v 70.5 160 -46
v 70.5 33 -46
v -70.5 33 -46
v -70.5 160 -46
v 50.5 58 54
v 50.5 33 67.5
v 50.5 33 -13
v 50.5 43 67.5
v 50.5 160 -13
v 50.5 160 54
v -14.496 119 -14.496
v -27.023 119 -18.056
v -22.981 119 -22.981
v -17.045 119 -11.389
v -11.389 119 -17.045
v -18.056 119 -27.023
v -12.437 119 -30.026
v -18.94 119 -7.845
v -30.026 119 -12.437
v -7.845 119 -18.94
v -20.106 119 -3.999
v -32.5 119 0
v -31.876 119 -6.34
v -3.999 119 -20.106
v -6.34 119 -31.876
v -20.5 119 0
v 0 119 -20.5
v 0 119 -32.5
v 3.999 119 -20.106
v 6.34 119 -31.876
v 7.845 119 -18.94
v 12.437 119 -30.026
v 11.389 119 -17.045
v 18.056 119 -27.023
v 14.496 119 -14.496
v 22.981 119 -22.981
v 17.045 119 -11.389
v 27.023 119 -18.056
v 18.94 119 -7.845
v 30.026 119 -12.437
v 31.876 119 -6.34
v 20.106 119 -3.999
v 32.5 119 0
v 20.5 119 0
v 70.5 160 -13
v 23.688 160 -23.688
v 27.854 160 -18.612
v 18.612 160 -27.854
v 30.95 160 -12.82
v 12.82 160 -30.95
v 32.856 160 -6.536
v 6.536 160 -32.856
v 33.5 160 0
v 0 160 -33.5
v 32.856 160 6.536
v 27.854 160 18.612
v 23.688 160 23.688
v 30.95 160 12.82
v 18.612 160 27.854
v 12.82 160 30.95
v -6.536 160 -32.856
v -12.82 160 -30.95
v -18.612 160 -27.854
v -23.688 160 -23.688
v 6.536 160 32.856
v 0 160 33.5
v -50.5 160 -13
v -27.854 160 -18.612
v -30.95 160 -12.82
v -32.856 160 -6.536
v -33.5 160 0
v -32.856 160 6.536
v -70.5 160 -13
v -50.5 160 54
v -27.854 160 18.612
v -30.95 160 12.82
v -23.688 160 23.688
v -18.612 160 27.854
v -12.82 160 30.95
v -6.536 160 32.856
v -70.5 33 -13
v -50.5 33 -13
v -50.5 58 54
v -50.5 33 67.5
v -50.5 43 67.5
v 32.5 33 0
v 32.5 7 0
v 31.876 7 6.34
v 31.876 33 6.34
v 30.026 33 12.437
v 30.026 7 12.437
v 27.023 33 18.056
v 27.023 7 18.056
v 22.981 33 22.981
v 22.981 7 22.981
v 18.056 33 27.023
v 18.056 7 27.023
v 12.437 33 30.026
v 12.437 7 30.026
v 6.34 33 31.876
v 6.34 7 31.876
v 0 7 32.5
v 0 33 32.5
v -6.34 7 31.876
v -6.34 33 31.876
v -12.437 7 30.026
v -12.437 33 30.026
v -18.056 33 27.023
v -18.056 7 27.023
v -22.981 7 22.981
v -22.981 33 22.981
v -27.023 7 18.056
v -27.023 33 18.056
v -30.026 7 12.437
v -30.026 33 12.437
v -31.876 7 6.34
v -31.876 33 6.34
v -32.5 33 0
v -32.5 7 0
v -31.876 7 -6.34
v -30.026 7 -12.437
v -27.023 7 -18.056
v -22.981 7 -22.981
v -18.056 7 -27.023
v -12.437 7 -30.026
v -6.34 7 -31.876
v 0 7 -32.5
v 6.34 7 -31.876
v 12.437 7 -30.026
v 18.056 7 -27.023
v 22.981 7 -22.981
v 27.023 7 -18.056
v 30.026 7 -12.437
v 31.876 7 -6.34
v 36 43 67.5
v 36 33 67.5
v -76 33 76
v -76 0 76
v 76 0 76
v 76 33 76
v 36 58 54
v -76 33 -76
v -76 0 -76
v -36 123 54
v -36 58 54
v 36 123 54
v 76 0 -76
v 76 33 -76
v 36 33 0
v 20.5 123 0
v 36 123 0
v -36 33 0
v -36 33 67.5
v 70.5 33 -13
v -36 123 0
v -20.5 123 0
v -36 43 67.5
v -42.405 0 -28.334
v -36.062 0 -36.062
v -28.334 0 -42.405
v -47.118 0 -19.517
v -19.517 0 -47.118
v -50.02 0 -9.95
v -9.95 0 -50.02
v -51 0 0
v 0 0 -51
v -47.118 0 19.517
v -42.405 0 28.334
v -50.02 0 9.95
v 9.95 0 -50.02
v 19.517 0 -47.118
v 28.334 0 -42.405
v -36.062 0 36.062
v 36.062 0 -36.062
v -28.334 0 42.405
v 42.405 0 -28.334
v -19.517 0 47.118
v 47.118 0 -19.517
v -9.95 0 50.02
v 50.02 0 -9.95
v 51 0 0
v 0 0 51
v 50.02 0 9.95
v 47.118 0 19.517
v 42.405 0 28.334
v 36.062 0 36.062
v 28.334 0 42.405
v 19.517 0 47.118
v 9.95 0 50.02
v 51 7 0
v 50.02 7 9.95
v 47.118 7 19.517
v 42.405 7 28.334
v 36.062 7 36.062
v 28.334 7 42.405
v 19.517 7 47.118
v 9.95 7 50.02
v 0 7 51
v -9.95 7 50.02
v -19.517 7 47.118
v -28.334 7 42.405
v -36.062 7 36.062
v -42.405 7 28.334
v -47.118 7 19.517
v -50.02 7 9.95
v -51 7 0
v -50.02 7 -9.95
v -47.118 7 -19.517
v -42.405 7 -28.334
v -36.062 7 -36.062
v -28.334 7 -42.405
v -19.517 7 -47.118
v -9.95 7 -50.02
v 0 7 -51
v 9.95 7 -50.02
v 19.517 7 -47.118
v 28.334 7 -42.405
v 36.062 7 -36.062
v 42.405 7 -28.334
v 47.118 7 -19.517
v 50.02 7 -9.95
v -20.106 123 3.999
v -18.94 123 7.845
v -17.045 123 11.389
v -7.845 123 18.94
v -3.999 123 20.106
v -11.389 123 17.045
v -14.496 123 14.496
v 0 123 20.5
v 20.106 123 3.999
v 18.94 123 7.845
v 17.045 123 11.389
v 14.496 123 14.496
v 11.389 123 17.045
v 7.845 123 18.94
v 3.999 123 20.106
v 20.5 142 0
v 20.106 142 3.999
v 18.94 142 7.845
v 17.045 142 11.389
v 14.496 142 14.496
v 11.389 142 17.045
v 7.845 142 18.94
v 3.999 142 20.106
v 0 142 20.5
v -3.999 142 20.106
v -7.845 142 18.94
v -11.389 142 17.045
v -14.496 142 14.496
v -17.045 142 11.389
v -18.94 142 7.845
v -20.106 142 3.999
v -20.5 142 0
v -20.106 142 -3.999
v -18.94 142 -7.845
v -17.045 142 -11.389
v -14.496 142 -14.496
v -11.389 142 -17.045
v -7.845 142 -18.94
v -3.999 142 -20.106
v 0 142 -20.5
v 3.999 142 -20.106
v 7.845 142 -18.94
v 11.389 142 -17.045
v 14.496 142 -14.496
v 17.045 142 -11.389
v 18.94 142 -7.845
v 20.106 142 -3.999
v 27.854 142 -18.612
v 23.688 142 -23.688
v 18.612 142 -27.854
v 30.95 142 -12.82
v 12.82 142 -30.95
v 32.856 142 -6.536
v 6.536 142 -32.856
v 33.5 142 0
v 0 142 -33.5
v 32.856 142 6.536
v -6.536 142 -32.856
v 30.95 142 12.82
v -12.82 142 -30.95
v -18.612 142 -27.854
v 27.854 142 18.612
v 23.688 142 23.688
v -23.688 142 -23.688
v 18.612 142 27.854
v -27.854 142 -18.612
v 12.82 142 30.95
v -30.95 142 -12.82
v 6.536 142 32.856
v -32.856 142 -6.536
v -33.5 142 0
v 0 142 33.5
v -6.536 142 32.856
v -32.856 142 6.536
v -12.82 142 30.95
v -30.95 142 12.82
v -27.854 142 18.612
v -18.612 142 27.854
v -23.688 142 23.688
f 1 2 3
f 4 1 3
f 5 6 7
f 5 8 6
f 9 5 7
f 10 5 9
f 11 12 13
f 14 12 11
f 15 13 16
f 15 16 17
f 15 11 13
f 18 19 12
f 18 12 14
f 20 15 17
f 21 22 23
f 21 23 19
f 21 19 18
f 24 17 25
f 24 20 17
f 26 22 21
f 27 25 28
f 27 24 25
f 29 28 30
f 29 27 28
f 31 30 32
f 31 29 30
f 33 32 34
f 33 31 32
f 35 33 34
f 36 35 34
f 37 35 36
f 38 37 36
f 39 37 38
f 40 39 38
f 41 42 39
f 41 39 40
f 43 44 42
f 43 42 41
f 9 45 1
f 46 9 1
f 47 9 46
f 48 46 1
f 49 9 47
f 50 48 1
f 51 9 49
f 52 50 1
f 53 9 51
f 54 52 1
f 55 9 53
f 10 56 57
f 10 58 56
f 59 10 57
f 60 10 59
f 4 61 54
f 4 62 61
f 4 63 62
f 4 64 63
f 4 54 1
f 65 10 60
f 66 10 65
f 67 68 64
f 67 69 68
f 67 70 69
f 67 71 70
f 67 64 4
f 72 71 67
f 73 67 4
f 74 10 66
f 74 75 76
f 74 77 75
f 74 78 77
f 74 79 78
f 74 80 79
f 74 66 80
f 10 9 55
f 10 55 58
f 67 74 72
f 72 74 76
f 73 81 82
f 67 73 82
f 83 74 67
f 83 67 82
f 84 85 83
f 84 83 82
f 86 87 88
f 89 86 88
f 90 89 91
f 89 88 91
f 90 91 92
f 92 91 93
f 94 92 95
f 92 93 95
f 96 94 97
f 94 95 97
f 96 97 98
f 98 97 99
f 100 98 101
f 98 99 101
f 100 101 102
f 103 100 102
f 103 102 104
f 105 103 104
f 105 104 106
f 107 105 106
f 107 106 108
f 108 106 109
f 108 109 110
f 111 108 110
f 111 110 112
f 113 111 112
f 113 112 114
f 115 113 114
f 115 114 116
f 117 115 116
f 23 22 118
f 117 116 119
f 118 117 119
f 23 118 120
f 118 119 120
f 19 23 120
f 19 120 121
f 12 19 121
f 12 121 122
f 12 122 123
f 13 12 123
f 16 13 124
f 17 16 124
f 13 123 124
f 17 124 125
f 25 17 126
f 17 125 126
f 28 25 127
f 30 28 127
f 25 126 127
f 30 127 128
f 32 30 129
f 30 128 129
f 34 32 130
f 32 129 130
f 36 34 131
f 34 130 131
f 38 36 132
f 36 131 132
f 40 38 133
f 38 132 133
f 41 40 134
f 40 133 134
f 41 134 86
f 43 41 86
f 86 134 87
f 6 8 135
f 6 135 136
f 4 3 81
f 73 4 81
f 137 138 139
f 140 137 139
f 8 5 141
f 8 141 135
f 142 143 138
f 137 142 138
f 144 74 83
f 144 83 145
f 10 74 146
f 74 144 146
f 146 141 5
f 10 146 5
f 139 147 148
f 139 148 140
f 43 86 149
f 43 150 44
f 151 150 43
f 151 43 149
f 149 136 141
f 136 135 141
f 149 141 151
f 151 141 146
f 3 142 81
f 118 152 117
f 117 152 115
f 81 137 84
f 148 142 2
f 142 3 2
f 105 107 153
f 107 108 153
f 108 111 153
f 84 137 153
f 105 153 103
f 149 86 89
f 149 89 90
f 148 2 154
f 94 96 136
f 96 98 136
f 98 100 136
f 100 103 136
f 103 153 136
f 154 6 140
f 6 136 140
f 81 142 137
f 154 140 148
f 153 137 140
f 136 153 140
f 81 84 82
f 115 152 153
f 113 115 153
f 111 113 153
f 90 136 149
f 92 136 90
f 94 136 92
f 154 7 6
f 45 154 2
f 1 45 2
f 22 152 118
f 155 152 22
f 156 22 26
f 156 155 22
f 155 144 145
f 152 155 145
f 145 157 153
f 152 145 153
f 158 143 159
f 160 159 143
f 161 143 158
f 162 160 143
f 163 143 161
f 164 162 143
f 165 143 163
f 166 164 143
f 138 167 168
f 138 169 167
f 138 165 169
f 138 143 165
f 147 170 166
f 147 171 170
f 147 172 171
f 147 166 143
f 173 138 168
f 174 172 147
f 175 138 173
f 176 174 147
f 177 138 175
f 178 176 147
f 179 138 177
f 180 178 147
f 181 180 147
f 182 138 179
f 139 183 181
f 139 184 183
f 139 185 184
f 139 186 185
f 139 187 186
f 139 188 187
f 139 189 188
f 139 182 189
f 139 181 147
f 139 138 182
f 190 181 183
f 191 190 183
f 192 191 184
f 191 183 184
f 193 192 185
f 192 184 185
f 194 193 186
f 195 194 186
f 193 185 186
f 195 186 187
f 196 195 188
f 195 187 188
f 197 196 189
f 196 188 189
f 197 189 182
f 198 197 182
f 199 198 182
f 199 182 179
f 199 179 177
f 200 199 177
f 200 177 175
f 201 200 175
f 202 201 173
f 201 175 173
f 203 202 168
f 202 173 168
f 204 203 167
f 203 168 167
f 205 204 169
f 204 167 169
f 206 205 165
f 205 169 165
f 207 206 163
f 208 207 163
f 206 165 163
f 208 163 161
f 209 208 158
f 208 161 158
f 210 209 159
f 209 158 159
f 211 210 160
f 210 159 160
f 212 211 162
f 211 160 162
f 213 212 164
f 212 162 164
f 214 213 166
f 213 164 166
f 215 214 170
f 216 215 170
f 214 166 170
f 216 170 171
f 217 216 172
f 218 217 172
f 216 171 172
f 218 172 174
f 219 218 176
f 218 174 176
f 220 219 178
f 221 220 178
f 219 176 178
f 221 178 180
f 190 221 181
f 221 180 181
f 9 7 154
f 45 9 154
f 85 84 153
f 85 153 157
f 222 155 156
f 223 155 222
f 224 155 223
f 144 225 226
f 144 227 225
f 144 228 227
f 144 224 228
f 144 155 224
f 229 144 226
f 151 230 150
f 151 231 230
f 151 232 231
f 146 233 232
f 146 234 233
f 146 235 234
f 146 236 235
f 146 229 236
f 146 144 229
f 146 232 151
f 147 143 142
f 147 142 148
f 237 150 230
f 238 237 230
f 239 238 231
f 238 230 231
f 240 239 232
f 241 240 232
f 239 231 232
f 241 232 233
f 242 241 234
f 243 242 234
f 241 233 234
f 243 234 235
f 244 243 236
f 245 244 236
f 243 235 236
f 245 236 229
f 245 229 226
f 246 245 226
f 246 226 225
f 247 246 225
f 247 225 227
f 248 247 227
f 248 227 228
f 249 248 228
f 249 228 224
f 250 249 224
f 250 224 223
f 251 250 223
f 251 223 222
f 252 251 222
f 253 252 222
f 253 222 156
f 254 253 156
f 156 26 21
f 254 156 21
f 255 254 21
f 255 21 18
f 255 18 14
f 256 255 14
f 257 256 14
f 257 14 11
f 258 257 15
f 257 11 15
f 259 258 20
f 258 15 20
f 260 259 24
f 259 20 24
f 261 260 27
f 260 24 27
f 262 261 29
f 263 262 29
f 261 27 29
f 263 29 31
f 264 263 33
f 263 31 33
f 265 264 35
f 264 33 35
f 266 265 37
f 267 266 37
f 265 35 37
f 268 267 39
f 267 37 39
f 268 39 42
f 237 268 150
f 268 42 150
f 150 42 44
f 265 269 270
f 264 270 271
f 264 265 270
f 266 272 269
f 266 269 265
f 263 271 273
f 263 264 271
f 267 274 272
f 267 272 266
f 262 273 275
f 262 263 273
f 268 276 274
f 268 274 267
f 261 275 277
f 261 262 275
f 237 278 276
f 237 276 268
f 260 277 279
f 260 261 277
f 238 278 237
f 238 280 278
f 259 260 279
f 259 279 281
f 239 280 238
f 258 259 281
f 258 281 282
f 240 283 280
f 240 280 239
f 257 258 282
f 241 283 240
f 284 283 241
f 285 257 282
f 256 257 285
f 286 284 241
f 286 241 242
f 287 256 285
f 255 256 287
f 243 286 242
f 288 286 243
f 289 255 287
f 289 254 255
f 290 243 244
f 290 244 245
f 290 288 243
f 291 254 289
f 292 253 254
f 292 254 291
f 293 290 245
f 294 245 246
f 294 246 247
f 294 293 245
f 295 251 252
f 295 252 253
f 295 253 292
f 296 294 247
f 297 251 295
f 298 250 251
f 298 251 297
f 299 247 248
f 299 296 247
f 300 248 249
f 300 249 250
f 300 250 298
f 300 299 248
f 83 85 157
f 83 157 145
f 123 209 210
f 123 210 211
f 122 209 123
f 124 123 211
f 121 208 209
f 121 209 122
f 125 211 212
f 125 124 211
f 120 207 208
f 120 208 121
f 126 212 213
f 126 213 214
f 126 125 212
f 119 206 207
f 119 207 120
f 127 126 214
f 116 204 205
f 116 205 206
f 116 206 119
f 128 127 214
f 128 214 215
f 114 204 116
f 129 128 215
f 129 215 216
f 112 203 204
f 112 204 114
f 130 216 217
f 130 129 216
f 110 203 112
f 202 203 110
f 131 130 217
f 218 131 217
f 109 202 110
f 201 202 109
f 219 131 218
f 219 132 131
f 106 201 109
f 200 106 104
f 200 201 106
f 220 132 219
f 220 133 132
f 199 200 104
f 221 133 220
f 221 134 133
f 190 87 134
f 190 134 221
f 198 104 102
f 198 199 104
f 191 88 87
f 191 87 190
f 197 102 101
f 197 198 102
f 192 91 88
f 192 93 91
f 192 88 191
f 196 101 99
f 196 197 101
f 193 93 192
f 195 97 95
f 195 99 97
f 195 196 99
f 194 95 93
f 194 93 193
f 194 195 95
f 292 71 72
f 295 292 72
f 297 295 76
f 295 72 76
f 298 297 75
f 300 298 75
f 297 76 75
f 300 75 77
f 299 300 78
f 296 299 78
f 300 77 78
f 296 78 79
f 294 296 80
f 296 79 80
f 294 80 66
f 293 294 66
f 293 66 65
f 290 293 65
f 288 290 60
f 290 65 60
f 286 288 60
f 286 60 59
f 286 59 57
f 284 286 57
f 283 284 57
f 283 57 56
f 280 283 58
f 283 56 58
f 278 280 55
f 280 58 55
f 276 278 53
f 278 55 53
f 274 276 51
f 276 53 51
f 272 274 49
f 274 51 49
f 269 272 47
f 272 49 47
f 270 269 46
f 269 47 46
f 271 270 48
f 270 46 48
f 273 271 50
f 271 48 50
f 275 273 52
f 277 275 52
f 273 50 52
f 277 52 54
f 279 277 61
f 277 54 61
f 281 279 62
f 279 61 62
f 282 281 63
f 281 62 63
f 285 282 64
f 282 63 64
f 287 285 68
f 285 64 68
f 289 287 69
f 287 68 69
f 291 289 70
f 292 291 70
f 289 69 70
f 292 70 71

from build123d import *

# Parameters (mm, degrees)
F0_W      = 152
F0_H      = 152
F1_DEPTH  = 33
F3_DEPTH  = 127
F4_R      = 20.5
F5_DEPTH  = 156
F4_R_2    = 32.5
F6_DEPTH  = 119
F4_R_3    = 51
F7_DEPTH  = 7
F8_R      = 33.5
F9_DEPTH  = 18
F10_W     = 72
F10_H     = 90
F11_DEPTH = 54
F13_DEPTH = 14.5
F15_DEPTH = 14.5


with BuildPart() as f1:
    # F0 (on Front) → F1 (new body)
    with BuildSketch(Plane.XZ):
        Rectangle(F0_W, F0_H)
    extrude(amount=-F1_DEPTH)

    # F2 (on face) → F3 (join)
    with BuildSketch(Plane(origin=(0, 33, 0), x_dir=(-1, 0, 0), z_dir=(0, 1, 0))):
        Polygon((50.5, 54), (-50.5, 54), (-50.5, -13), (-70.5, -13), (-70.5, -46), (70.5, -46), (70.5, -13), (50.5, -13), align=None)
    extrude(amount=F3_DEPTH)

    # F4 (on Front) → F5 (cut)
    with BuildSketch(Plane.XZ):
        Circle(F4_R)
    extrude(amount=-F5_DEPTH, mode=Mode.SUBTRACT)

    # F4 (on Front) → F6 (cut)
    with BuildSketch(Plane.XZ):
        Circle(F4_R_2)
        Circle(F4_R, mode=Mode.SUBTRACT)
        Circle(F4_R)
    extrude(amount=-F6_DEPTH, mode=Mode.SUBTRACT)

    # F4 (on Front) → F7 (cut)
    with BuildSketch(Plane.XZ):
        Circle(F4_R_3)
        Circle(F4_R_2, mode=Mode.SUBTRACT)
    extrude(amount=-F7_DEPTH, mode=Mode.SUBTRACT)

    # F8 (on face) → F9 (cut)
    with BuildSketch(Plane(origin=(0, 160, 0), x_dir=(-1, 0, 0), z_dir=(0, 1, 0))):
        Circle(F8_R)
    extrude(amount=-F9_DEPTH, mode=Mode.SUBTRACT)

    # F10 (on face) → F11 (cut)
    with BuildSketch(Plane.XY.offset(54)):
        with Locations((0, 78)):
            Rectangle(F10_W, F10_H)
    extrude(amount=-F11_DEPTH, mode=Mode.SUBTRACT)

    # F12 (on face) → F13 (join)
    with BuildSketch(Plane.YZ.offset(50.5)):
        Polygon((33, 67.5), (33, 54), (58, 54), (43, 67.5), align=None)
    extrude(amount=-F13_DEPTH)

    # F14 (on face) → F15 (join)
    with BuildSketch(Plane(origin=(-50.5, 0, 0), x_dir=(0, -1, 0), z_dir=(-1, 0, 0))):
        Polygon((-58, 54), (-33, 54), (-33, 67.5), (-43, 67.5), align=None)
    extrude(amount=-F15_DEPTH)


solid = f1.part
